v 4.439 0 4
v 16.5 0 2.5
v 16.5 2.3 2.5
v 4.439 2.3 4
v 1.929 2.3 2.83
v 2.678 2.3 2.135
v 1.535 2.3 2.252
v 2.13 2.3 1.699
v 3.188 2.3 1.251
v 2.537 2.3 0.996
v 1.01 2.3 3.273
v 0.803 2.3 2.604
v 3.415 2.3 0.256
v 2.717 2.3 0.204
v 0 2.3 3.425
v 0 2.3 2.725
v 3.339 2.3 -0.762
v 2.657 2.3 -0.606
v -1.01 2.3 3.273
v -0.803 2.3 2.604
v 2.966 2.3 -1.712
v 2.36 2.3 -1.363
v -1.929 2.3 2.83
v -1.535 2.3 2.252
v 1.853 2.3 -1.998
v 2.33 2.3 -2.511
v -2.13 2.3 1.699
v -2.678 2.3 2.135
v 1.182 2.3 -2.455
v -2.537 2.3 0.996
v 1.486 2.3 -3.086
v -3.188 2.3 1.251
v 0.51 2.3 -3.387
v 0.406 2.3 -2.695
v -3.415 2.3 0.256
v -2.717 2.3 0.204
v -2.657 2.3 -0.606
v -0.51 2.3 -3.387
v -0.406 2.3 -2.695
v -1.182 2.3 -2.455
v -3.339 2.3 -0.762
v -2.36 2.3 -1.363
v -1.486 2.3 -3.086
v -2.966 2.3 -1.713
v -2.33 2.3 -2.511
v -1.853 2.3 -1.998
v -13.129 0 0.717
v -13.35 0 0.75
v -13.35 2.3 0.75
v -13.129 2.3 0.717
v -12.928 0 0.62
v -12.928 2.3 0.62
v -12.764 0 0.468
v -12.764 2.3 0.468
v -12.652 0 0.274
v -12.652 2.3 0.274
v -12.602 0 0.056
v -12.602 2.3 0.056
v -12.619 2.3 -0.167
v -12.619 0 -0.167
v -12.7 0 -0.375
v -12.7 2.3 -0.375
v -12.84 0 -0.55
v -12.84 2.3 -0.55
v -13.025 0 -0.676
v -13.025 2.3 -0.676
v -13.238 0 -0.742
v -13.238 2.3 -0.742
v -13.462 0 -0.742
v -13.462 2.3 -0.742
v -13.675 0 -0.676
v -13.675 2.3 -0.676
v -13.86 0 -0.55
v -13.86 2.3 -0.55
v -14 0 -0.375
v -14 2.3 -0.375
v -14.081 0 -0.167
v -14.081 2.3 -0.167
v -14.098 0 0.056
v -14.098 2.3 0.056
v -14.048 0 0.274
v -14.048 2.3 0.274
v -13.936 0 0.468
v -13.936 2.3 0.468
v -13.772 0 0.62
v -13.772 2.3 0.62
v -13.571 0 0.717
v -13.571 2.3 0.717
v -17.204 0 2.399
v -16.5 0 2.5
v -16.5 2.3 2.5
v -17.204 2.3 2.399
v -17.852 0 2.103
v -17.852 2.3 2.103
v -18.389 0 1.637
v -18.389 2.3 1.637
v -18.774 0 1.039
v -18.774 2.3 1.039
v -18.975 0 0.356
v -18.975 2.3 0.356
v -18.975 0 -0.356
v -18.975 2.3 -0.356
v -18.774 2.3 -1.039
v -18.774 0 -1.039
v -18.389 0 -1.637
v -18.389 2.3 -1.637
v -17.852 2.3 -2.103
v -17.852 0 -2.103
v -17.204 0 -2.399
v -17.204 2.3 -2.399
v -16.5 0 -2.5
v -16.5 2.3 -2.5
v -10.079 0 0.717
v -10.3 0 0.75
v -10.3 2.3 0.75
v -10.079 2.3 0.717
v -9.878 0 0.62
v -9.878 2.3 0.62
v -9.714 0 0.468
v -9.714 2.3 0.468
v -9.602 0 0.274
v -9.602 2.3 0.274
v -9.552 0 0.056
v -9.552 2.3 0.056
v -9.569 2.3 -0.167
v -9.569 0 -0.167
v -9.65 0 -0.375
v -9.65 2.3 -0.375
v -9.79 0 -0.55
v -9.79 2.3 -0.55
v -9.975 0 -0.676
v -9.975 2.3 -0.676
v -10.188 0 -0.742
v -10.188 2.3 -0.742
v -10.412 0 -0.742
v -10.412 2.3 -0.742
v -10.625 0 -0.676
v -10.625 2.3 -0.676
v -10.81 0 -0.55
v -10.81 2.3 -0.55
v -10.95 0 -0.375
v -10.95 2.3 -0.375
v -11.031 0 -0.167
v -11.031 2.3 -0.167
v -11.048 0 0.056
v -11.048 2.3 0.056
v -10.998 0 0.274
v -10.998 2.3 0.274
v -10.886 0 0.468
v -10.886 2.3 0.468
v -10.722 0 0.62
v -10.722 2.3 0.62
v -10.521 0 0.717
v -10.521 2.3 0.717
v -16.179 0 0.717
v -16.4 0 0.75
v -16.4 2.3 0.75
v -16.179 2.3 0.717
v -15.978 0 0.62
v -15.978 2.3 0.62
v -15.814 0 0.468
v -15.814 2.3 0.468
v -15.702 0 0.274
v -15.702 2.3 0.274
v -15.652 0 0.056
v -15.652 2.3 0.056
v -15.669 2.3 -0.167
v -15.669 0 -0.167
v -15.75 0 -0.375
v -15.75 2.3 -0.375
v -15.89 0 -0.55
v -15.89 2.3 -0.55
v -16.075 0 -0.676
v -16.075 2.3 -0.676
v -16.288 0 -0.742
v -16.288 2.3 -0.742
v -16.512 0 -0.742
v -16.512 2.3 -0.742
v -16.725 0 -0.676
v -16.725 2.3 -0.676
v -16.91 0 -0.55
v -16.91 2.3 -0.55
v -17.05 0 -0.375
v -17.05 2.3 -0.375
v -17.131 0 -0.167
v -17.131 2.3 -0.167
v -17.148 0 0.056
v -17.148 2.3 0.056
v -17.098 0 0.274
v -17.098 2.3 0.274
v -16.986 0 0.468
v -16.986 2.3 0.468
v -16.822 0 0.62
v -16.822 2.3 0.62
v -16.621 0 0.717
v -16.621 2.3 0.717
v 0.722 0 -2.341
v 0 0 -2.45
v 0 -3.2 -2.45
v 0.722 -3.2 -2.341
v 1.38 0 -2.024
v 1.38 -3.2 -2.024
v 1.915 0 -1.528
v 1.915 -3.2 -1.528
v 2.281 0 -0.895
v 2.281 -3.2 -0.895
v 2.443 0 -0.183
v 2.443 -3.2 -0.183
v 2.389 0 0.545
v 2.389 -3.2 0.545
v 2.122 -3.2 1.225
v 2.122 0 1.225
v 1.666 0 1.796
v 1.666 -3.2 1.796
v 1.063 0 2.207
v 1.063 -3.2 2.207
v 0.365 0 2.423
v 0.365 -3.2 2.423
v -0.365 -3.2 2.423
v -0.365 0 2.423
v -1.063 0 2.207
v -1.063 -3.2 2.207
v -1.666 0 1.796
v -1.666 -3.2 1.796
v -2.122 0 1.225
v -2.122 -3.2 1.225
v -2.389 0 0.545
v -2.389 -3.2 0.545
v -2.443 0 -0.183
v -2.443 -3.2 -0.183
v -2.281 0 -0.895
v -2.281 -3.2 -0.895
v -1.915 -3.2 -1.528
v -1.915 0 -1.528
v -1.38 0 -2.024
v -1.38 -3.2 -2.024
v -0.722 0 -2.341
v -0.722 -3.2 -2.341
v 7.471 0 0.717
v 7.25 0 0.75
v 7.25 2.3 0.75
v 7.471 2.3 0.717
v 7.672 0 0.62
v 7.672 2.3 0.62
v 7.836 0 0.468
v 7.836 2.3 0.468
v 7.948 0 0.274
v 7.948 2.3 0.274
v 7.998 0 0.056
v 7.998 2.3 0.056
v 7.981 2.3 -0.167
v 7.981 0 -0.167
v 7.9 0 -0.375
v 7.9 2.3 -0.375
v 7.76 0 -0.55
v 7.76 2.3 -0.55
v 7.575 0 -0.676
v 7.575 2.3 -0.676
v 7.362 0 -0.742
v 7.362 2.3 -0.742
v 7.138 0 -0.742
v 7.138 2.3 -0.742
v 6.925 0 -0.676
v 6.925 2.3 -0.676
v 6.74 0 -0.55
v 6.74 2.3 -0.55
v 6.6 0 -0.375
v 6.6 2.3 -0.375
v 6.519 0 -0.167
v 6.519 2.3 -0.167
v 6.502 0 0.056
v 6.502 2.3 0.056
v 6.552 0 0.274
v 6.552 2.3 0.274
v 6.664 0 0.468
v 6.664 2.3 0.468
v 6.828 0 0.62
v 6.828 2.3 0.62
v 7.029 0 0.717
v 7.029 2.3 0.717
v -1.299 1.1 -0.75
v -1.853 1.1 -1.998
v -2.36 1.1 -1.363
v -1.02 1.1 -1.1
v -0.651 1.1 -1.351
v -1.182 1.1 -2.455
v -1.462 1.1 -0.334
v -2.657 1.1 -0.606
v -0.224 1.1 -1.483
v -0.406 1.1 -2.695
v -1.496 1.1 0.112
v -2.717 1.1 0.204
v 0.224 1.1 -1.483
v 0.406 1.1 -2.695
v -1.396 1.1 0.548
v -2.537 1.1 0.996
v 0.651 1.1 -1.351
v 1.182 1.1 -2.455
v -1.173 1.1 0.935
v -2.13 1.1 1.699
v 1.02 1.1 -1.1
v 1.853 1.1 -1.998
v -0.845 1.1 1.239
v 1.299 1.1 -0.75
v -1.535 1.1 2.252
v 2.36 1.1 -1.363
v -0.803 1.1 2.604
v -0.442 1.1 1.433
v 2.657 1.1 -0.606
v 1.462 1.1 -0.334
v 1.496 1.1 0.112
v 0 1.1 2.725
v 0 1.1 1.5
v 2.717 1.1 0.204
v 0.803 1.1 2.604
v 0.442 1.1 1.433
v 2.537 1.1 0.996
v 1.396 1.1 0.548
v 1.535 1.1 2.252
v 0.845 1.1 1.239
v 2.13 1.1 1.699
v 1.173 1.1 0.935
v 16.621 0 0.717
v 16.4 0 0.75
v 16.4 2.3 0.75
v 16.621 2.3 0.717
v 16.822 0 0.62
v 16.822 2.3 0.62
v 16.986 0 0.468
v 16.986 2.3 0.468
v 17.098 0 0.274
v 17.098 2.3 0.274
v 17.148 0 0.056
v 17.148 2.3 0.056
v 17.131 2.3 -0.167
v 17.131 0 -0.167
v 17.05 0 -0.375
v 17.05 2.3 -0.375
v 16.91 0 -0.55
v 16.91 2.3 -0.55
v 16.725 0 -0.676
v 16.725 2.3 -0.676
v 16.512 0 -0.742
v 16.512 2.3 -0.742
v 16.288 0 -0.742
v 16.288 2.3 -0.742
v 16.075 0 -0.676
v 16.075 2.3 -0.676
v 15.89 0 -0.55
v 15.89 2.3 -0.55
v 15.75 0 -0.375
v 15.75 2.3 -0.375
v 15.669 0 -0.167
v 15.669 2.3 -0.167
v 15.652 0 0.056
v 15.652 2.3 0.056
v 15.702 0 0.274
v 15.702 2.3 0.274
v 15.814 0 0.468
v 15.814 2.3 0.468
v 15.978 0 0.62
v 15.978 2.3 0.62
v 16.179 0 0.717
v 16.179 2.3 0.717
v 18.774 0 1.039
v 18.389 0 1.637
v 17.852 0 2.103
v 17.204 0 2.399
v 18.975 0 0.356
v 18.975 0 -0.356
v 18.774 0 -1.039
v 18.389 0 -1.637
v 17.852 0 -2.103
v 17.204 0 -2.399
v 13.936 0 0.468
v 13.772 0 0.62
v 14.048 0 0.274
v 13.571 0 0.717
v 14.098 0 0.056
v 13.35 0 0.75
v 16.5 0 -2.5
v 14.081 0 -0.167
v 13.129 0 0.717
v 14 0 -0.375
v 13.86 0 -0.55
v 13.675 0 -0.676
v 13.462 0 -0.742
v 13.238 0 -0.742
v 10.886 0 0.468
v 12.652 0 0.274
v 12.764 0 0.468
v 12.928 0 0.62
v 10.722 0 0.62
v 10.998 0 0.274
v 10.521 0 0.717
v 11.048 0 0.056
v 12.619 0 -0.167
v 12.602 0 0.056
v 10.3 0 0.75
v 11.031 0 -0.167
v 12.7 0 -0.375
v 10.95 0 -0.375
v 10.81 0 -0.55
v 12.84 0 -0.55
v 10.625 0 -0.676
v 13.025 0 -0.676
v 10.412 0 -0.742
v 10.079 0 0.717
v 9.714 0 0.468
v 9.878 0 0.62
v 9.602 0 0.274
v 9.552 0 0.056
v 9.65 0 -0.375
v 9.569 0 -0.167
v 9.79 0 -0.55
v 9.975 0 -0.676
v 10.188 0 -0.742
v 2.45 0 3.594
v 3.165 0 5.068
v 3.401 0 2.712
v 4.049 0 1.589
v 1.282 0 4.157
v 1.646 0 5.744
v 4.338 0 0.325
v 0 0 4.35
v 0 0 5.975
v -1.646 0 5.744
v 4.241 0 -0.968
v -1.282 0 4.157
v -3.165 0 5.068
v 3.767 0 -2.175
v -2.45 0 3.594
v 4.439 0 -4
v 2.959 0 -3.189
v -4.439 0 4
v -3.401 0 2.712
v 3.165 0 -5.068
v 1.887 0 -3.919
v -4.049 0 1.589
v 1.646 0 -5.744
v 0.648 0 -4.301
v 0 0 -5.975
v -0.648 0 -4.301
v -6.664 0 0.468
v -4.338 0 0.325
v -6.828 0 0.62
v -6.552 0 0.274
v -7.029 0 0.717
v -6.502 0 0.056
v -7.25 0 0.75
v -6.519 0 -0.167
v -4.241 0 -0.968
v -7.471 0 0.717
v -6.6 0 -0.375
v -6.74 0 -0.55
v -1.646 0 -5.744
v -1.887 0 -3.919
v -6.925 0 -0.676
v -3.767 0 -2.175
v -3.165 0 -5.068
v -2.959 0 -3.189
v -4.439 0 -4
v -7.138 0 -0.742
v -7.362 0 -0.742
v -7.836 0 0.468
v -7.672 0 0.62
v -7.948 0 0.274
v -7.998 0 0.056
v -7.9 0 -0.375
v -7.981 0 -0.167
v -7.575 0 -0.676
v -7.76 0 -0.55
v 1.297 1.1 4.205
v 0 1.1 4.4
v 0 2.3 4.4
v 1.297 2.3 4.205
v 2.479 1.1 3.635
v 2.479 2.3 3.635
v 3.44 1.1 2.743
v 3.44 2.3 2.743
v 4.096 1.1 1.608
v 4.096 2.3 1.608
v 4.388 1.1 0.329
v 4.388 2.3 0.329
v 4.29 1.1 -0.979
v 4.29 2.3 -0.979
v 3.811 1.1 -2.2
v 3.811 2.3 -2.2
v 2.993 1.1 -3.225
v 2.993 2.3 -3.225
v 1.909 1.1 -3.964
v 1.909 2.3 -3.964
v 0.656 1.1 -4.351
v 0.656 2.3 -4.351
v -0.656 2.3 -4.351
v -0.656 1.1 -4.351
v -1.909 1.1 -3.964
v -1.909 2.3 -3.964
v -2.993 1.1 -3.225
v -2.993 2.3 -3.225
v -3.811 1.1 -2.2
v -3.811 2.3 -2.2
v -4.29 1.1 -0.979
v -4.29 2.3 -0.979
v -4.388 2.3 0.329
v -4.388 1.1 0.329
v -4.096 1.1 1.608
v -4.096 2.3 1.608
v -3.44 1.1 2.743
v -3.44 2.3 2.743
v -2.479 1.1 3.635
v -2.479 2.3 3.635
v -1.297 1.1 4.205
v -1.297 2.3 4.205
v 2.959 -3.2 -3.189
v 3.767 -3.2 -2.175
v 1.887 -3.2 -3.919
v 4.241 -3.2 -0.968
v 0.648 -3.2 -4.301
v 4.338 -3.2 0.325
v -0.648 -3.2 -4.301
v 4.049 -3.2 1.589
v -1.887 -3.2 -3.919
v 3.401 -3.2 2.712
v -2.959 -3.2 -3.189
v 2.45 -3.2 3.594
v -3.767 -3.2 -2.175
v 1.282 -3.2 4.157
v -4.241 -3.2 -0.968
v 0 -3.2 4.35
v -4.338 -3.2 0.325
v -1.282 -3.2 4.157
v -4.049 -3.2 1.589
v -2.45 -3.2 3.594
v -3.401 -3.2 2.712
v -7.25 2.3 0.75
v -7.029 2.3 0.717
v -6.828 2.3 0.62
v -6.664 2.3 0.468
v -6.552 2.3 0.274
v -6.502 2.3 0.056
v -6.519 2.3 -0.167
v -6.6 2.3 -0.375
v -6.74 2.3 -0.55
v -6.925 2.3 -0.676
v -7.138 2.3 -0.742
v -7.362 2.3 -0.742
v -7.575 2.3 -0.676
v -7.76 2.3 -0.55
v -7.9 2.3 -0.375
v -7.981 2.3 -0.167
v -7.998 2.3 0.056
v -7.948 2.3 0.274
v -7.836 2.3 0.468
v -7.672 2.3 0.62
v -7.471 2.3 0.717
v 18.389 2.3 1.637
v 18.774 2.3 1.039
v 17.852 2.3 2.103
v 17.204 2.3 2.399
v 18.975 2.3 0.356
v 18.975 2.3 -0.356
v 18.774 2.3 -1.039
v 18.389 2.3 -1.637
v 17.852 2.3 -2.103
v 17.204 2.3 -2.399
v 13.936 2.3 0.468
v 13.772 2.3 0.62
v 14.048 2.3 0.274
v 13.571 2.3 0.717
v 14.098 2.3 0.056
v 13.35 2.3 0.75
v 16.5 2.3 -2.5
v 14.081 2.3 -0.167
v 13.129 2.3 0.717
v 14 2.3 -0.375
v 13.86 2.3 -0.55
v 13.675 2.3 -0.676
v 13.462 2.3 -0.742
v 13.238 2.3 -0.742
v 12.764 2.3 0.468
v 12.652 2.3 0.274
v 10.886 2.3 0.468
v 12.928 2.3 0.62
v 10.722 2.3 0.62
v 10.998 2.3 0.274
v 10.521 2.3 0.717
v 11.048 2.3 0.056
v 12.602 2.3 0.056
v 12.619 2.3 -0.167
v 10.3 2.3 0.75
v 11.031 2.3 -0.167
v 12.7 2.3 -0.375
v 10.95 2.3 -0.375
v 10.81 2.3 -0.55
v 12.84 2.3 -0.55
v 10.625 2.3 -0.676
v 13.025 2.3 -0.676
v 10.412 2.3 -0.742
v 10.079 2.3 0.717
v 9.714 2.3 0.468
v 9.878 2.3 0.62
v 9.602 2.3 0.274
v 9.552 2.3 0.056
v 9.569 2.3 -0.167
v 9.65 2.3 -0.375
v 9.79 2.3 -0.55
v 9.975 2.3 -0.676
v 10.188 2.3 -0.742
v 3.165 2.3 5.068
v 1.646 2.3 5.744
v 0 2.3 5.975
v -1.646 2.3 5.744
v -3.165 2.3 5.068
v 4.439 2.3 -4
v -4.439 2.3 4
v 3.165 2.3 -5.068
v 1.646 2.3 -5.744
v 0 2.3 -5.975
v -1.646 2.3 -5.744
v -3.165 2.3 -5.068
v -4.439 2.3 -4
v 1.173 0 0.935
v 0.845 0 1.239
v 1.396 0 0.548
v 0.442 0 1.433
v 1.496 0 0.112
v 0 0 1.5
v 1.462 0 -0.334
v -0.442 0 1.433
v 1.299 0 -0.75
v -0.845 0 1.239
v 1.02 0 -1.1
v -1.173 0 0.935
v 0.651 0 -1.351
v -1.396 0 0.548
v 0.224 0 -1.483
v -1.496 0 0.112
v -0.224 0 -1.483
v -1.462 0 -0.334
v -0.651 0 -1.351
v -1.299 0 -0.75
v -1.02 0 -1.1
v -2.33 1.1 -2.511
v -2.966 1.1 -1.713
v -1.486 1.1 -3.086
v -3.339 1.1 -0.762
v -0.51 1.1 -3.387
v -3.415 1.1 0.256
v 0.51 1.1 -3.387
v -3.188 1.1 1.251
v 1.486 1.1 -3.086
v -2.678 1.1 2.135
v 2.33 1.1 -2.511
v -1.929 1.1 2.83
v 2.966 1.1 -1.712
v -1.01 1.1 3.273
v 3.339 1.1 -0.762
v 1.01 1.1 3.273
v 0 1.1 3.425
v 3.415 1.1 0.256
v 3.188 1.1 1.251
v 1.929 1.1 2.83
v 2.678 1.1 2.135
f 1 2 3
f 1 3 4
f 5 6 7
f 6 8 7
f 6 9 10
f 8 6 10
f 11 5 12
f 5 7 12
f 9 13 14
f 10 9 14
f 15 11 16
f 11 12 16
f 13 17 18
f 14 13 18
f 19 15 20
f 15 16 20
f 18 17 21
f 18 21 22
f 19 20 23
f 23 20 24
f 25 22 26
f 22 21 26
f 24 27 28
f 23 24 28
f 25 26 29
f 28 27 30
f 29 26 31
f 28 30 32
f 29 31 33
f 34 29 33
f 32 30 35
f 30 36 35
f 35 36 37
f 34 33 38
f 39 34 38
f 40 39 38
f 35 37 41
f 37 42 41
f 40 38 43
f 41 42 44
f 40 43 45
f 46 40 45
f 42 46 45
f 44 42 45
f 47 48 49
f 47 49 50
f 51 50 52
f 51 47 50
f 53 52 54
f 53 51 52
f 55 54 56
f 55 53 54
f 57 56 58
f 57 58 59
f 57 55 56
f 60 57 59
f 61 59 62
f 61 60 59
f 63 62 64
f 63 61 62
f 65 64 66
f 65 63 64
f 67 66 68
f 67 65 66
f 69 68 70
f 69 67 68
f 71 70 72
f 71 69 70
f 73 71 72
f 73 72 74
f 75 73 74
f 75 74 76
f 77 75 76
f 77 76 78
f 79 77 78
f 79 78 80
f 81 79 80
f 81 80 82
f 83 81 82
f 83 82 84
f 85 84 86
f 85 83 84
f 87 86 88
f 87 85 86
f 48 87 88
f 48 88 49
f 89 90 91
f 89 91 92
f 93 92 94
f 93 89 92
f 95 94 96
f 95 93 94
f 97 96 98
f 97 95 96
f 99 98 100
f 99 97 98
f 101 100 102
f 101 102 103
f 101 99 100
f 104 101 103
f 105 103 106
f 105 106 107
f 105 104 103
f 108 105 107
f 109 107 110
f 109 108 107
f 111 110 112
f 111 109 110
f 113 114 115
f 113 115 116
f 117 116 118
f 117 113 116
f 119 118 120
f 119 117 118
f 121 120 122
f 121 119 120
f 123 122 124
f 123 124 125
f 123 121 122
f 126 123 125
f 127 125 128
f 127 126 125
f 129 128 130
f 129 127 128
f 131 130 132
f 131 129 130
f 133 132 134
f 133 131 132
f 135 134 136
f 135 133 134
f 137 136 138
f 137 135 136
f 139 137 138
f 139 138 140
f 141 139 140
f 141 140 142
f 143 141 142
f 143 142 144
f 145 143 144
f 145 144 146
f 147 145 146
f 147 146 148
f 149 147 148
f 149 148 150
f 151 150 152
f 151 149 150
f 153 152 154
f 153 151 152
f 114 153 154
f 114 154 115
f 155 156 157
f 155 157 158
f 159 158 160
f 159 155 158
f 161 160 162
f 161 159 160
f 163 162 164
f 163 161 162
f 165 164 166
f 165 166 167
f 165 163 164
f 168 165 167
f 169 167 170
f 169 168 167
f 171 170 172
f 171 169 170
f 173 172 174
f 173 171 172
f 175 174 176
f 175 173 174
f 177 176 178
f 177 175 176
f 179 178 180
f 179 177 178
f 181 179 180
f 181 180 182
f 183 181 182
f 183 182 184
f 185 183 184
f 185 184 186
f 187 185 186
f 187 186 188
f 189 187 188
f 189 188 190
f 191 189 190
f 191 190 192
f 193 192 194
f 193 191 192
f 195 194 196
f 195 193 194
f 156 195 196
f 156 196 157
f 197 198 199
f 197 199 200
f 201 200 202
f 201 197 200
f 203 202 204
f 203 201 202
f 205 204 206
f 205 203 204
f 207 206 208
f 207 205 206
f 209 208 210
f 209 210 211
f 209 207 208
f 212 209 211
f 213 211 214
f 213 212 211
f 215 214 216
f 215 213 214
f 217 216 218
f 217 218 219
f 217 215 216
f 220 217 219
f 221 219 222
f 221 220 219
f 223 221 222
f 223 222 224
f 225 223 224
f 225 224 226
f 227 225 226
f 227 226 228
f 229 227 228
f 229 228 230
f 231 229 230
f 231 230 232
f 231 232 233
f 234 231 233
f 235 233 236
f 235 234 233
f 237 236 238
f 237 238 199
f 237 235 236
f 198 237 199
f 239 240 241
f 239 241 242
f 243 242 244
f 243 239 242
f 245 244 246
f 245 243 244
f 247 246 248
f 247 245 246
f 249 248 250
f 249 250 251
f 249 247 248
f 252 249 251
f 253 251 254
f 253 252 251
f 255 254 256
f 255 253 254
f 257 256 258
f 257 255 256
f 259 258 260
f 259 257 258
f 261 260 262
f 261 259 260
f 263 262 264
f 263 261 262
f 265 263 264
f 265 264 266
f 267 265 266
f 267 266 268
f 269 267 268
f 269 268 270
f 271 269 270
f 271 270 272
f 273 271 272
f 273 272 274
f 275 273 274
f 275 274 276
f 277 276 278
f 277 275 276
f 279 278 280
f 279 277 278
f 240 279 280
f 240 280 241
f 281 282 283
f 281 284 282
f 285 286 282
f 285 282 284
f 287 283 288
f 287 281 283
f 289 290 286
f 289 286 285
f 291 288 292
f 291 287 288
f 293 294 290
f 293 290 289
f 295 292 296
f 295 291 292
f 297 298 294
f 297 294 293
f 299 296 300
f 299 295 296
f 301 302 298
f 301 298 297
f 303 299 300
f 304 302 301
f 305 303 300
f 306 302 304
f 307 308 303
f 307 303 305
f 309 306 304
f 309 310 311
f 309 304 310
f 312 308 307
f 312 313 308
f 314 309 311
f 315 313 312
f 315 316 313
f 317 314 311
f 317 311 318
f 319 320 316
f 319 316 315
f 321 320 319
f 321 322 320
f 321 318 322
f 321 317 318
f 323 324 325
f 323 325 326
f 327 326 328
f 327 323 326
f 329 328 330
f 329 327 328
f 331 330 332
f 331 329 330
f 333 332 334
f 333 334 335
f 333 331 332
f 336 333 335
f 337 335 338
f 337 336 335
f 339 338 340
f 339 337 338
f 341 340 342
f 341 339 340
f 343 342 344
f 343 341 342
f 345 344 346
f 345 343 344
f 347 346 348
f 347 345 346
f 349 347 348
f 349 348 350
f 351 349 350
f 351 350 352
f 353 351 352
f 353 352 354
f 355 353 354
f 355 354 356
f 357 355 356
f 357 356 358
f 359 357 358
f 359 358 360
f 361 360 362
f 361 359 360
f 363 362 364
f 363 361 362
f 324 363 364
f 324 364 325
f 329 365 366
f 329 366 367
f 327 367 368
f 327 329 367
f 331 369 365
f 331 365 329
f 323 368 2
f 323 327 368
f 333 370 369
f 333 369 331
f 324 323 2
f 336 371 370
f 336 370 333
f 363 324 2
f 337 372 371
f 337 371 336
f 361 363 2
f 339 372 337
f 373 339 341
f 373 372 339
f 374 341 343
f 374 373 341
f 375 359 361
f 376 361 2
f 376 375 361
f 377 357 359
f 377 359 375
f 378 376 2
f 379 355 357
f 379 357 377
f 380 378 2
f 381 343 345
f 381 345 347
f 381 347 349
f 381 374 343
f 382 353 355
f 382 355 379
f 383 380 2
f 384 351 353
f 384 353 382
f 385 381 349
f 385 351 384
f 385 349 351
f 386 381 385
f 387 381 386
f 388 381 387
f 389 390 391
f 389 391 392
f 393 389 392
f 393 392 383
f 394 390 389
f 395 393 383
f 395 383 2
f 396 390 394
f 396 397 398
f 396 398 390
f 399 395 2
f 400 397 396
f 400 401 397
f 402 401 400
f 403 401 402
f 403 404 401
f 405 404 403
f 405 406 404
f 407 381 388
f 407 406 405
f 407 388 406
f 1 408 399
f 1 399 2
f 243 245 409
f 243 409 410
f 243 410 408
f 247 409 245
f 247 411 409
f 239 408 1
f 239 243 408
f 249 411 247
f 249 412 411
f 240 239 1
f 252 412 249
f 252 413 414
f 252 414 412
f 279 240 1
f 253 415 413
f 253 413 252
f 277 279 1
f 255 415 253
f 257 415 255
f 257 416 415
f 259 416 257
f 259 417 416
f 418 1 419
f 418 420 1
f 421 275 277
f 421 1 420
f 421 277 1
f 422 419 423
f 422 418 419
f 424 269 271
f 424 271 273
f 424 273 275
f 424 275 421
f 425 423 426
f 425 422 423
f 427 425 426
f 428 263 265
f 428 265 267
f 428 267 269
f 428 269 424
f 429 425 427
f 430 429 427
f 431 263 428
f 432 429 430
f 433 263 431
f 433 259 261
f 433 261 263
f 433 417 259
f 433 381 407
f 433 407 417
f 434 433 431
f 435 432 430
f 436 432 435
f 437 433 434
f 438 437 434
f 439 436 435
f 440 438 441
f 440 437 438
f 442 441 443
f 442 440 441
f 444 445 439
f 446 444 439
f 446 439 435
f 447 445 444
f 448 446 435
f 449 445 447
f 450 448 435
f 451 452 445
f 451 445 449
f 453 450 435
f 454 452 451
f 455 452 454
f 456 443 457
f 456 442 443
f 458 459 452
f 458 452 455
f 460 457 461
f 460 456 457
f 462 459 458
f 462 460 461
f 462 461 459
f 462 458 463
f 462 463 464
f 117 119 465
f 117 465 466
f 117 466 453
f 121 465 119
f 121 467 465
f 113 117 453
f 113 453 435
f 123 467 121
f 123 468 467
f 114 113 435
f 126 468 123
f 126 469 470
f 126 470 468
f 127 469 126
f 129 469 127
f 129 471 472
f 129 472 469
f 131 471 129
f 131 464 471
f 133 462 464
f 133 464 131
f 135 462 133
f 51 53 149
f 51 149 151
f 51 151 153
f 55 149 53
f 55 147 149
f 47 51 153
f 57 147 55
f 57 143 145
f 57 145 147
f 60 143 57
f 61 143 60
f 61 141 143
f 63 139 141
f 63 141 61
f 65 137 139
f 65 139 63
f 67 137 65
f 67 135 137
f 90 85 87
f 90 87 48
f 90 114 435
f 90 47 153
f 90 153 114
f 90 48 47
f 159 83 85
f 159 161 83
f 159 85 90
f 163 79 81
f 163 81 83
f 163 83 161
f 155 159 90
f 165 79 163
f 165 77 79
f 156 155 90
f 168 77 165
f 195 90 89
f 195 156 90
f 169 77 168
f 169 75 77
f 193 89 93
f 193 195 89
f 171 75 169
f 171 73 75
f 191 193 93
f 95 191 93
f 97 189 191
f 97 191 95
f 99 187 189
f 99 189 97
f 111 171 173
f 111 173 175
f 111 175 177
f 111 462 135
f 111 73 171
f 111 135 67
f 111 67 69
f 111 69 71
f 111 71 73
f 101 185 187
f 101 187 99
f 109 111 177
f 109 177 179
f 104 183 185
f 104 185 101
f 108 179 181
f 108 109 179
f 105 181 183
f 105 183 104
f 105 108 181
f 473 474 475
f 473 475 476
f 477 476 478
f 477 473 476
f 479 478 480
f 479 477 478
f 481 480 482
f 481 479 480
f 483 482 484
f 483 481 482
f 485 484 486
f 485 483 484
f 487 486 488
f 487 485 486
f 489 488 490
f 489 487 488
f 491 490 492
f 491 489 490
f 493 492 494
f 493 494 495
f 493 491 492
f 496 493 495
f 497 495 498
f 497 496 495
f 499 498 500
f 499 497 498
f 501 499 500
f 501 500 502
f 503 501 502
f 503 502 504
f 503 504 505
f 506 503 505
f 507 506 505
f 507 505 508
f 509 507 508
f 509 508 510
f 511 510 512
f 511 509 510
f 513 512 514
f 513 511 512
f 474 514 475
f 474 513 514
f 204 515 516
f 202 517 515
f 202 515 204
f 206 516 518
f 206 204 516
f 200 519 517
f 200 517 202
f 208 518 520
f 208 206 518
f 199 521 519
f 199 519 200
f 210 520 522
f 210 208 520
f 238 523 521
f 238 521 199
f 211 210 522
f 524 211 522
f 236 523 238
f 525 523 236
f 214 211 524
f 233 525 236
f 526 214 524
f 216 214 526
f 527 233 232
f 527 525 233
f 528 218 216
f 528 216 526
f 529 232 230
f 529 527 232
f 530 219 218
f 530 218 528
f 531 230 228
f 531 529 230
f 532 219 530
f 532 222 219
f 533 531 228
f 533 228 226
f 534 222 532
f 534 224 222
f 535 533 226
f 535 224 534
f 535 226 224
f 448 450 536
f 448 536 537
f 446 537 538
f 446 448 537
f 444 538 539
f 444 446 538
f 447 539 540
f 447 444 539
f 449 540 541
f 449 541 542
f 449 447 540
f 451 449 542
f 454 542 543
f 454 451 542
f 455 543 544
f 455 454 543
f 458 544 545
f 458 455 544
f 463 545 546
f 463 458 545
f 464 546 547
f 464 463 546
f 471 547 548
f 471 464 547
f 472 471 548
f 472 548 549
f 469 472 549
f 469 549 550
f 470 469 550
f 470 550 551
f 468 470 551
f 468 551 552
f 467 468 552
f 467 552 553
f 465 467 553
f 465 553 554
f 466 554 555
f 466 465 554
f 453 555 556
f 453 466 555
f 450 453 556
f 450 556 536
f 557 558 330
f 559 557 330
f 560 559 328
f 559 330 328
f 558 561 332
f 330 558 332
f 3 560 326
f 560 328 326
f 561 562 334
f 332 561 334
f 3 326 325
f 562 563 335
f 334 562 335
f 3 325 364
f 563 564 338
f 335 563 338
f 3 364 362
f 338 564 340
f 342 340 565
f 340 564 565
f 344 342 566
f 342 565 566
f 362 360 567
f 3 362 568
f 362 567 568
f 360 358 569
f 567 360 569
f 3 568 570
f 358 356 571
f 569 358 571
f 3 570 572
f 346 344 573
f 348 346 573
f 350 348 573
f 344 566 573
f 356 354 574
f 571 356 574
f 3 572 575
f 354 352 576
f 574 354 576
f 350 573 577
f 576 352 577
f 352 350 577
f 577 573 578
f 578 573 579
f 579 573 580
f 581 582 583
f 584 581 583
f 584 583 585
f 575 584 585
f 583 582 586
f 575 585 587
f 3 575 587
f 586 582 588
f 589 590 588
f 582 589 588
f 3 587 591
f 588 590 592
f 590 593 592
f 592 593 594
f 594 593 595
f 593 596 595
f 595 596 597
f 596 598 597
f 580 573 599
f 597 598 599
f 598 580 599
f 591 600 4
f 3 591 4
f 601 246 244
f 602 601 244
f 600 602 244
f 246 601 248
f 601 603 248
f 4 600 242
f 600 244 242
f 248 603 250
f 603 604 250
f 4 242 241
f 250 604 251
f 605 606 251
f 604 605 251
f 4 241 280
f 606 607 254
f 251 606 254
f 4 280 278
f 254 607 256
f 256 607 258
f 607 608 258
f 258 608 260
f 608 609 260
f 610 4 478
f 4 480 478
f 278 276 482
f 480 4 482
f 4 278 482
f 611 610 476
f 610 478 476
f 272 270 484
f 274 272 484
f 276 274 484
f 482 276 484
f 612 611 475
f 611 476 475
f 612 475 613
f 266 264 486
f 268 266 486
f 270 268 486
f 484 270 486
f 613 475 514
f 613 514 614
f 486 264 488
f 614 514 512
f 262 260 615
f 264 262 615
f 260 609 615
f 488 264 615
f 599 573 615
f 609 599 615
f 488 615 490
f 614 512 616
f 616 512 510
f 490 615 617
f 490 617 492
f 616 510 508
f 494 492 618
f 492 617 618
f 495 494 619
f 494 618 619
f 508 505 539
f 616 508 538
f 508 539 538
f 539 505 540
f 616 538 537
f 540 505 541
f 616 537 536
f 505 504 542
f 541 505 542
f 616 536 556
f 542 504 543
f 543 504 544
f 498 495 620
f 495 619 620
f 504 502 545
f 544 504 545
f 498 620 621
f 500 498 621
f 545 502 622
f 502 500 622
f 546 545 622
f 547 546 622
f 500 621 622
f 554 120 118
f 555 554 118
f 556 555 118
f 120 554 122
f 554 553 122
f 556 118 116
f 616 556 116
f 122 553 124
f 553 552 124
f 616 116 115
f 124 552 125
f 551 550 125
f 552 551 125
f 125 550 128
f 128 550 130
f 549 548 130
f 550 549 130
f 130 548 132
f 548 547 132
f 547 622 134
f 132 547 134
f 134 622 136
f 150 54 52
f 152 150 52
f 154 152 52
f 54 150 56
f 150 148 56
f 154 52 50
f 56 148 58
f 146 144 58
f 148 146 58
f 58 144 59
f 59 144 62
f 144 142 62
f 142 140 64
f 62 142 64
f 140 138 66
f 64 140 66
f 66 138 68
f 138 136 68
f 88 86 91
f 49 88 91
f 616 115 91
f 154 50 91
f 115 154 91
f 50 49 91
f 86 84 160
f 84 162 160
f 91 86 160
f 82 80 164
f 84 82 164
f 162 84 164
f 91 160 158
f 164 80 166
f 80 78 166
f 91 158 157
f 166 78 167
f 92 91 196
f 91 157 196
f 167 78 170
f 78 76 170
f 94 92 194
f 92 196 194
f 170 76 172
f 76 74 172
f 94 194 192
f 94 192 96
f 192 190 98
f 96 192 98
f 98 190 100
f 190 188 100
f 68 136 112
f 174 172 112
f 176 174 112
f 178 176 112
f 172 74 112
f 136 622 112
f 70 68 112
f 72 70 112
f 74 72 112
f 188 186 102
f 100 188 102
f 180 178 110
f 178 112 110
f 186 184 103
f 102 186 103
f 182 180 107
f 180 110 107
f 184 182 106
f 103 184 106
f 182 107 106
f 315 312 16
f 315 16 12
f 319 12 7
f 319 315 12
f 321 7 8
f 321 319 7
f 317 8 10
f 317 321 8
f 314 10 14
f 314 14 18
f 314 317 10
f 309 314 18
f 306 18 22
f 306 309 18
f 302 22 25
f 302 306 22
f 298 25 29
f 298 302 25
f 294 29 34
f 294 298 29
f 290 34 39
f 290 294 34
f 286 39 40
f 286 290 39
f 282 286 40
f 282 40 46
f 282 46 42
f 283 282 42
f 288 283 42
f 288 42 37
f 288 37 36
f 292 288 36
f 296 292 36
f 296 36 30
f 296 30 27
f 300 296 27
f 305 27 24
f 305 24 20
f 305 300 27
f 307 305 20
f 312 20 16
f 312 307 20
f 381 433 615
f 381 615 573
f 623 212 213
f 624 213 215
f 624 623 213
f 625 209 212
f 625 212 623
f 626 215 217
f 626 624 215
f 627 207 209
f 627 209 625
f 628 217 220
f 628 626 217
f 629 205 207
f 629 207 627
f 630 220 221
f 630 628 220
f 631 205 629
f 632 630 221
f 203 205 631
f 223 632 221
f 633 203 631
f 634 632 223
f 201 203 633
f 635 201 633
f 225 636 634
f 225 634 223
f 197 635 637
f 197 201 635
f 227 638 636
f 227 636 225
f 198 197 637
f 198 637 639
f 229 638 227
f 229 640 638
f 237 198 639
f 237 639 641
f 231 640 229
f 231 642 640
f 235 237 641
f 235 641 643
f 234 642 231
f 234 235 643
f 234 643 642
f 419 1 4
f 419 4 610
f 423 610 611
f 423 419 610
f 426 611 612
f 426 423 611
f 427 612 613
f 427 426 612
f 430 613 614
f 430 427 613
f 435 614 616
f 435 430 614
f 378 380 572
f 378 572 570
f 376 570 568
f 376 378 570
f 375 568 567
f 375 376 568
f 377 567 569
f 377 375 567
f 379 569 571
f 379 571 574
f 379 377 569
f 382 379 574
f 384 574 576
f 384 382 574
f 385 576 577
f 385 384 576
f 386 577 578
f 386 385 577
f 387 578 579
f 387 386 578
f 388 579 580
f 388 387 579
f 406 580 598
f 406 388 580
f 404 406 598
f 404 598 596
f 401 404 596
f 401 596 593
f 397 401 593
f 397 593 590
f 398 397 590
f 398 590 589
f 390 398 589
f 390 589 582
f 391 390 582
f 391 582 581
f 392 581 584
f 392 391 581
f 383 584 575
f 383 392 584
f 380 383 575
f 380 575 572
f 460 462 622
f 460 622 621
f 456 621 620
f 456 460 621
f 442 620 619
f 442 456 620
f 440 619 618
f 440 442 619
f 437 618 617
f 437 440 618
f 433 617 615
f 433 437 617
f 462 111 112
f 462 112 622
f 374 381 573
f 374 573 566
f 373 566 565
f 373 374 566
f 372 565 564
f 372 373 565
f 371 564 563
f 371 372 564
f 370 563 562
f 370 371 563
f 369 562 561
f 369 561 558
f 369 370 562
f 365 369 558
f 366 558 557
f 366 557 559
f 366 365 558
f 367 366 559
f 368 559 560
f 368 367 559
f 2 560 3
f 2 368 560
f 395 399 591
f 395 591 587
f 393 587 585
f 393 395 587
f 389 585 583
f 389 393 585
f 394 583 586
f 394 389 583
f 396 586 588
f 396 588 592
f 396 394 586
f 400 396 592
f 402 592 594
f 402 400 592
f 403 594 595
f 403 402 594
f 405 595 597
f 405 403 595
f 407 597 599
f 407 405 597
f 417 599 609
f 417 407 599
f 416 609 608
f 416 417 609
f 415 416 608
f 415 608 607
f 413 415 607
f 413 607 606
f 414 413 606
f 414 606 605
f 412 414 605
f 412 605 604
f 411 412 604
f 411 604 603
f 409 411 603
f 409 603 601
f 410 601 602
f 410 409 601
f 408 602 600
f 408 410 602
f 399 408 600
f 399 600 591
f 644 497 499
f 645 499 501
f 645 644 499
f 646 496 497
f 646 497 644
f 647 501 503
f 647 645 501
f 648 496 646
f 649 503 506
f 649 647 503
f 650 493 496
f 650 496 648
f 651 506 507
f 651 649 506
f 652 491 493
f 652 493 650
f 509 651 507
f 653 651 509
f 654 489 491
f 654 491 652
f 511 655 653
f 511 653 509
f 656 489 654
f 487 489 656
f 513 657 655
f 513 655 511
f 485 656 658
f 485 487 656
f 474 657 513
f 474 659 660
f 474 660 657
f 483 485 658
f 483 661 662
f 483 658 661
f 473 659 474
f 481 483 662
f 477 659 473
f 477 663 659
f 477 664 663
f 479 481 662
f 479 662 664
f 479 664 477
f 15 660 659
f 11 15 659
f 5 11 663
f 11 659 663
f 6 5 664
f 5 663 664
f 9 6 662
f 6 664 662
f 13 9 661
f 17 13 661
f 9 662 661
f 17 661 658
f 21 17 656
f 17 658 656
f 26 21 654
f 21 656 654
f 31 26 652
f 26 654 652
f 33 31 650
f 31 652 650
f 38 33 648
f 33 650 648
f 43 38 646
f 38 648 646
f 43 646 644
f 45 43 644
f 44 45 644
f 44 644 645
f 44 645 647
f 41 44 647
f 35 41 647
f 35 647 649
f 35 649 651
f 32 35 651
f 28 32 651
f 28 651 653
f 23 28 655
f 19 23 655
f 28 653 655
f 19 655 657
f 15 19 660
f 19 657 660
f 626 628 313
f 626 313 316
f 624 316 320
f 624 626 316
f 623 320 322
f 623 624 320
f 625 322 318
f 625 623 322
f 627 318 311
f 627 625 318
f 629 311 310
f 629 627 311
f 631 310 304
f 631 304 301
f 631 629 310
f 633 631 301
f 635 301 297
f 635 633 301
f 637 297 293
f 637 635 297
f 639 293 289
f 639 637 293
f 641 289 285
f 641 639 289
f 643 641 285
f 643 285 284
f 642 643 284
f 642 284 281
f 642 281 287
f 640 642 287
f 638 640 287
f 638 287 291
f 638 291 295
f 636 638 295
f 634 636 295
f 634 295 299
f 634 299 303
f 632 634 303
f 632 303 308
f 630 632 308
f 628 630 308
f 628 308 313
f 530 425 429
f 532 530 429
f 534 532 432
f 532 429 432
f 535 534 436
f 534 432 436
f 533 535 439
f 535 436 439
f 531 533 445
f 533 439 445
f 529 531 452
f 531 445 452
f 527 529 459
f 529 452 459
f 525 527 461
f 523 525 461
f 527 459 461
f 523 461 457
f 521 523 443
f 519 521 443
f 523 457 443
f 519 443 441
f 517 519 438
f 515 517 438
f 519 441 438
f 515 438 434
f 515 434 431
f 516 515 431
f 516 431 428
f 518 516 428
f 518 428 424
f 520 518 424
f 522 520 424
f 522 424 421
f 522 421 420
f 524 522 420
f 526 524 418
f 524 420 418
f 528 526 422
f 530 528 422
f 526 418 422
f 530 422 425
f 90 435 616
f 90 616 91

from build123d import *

# Parameters (mm, degrees)
SKETCH_1_R          = 1.5
SKETCH_1_R_2        = 0.75
EXTRUDE_1_DEPTH     = 2.3
SKETCH_2_R          = 4.35
SKETCH_2_R_2        = 2.45
EXTRUDE_2_DEPTH     = 3.2
CUT_EXTRUDE_START   = -1.2
SKETCH_3_R          = 4.4
SKETCH_3_R_2        = 3.425
SKETCH_3_R_3        = 2.725
SKETCH_3_R_4        = 1.5
CUT_EXTRUDE_1_DEPTH = 1.2


with BuildPart() as part:
    # Sketch 1 → Бобышка-Вытянуть1 (new body)
    with BuildSketch(Plane(origin=(0, 0, 0), x_dir=(1, 0, 0), z_dir=(0, 1, 0))):
        with BuildLine():
            Line((4.438538611, 4), (16.5, 2.5))
            ThreePointArc((16.5, 2.5), (19, 0), (16.5, -2.5))
            Line((16.5, -2.5), (4.438538611, -4))
            ThreePointArc((4.438538611, -4), (0, -5.975), (-4.438538611, -4))
            Line((-4.438538611, -4), (-16.5, -2.5))
            ThreePointArc((-16.5, -2.5), (-19, 0), (-16.5, 2.5))
            Line((-16.5, 2.5), (-4.438538611, 4))
            ThreePointArc((-4.438538611, 4), (0, 5.975), (4.438538611, 4))
        make_face()
        with Locations(Location((0, 0, 0), (0, 0, 270))):
            Circle(SKETCH_1_R, mode=Mode.SUBTRACT)
        with Locations(Location((10.3, 0, 0), (0, 0, 270))):
            Circle(SKETCH_1_R_2, mode=Mode.SUBTRACT)
        with Locations(Location((13.35, 0, 0), (0, 0, 270))):
            Circle(SKETCH_1_R_2, mode=Mode.SUBTRACT)
        with Locations(Location((16.4, 0, 0), (0, 0, 270))):
            Circle(SKETCH_1_R_2, mode=Mode.SUBTRACT)
        with Locations(Location((-10.3, 0, 0), (0, 0, 270))):
            Circle(SKETCH_1_R_2, mode=Mode.SUBTRACT)
        with Locations(Location((-13.35, 0, 0), (0, 0, 270))):
            Circle(SKETCH_1_R_2, mode=Mode.SUBTRACT)
        with Locations(Location((-16.4, 0, 0), (0, 0, 270))):
            Circle(SKETCH_1_R_2, mode=Mode.SUBTRACT)
        with Locations(Location((7.25, 0, 0), (0, 0, 270))):
            Circle(SKETCH_1_R_2, mode=Mode.SUBTRACT)
        with Locations(Location((-7.25, 0, 0), (0, 0, 270))):
            Circle(SKETCH_1_R_2, mode=Mode.SUBTRACT)
    extrude(amount=EXTRUDE_1_DEPTH)

    # Эскиз2 → Бобышка-Вытянуть2 (add)
    with BuildSketch(Plane.XZ):
        with Locations(Location((0, 0, 0), (0, 0, 90))):
            Circle(SKETCH_2_R)
        with Locations(Location((0, 0, 0), (0, 0, 270))):
            Circle(SKETCH_2_R_2, mode=Mode.SUBTRACT)
    extrude(amount=EXTRUDE_2_DEPTH)

    # Эскиз3 → Вырез-Вытянуть1 (cut)
    # profile 1 of 2: a face of its own
    with BuildSketch(Plane(origin=(0, 2.3, 0), x_dir=(1, 0, 0), z_dir=(0, 1, 0)).offset(CUT_EXTRUDE_START)):
        with Locations(Location((0, 0, 0), (0, 0, 270))):
            Circle(SKETCH_3_R)
        with Locations(Location((0, 0, 0), (0, 0, 270))):
            Circle(SKETCH_3_R_2, mode=Mode.SUBTRACT)
    # profile 2 of 2: a face of its own
    with BuildSketch(Plane(origin=(0, 2.3, 0), x_dir=(1, 0, 0), z_dir=(0, 1, 0)).offset(CUT_EXTRUDE_START)):
        with Locations(Location((0, 0, 0), (0, 0, 270))):
            Circle(SKETCH_3_R_3)
        with Locations(Location((0, 0, 0), (0, 0, 270))):
            Circle(SKETCH_3_R_4, mode=Mode.SUBTRACT)
    extrude(amount=CUT_EXTRUDE_1_DEPTH, mode=Mode.SUBTRACT)


solid = part.part
